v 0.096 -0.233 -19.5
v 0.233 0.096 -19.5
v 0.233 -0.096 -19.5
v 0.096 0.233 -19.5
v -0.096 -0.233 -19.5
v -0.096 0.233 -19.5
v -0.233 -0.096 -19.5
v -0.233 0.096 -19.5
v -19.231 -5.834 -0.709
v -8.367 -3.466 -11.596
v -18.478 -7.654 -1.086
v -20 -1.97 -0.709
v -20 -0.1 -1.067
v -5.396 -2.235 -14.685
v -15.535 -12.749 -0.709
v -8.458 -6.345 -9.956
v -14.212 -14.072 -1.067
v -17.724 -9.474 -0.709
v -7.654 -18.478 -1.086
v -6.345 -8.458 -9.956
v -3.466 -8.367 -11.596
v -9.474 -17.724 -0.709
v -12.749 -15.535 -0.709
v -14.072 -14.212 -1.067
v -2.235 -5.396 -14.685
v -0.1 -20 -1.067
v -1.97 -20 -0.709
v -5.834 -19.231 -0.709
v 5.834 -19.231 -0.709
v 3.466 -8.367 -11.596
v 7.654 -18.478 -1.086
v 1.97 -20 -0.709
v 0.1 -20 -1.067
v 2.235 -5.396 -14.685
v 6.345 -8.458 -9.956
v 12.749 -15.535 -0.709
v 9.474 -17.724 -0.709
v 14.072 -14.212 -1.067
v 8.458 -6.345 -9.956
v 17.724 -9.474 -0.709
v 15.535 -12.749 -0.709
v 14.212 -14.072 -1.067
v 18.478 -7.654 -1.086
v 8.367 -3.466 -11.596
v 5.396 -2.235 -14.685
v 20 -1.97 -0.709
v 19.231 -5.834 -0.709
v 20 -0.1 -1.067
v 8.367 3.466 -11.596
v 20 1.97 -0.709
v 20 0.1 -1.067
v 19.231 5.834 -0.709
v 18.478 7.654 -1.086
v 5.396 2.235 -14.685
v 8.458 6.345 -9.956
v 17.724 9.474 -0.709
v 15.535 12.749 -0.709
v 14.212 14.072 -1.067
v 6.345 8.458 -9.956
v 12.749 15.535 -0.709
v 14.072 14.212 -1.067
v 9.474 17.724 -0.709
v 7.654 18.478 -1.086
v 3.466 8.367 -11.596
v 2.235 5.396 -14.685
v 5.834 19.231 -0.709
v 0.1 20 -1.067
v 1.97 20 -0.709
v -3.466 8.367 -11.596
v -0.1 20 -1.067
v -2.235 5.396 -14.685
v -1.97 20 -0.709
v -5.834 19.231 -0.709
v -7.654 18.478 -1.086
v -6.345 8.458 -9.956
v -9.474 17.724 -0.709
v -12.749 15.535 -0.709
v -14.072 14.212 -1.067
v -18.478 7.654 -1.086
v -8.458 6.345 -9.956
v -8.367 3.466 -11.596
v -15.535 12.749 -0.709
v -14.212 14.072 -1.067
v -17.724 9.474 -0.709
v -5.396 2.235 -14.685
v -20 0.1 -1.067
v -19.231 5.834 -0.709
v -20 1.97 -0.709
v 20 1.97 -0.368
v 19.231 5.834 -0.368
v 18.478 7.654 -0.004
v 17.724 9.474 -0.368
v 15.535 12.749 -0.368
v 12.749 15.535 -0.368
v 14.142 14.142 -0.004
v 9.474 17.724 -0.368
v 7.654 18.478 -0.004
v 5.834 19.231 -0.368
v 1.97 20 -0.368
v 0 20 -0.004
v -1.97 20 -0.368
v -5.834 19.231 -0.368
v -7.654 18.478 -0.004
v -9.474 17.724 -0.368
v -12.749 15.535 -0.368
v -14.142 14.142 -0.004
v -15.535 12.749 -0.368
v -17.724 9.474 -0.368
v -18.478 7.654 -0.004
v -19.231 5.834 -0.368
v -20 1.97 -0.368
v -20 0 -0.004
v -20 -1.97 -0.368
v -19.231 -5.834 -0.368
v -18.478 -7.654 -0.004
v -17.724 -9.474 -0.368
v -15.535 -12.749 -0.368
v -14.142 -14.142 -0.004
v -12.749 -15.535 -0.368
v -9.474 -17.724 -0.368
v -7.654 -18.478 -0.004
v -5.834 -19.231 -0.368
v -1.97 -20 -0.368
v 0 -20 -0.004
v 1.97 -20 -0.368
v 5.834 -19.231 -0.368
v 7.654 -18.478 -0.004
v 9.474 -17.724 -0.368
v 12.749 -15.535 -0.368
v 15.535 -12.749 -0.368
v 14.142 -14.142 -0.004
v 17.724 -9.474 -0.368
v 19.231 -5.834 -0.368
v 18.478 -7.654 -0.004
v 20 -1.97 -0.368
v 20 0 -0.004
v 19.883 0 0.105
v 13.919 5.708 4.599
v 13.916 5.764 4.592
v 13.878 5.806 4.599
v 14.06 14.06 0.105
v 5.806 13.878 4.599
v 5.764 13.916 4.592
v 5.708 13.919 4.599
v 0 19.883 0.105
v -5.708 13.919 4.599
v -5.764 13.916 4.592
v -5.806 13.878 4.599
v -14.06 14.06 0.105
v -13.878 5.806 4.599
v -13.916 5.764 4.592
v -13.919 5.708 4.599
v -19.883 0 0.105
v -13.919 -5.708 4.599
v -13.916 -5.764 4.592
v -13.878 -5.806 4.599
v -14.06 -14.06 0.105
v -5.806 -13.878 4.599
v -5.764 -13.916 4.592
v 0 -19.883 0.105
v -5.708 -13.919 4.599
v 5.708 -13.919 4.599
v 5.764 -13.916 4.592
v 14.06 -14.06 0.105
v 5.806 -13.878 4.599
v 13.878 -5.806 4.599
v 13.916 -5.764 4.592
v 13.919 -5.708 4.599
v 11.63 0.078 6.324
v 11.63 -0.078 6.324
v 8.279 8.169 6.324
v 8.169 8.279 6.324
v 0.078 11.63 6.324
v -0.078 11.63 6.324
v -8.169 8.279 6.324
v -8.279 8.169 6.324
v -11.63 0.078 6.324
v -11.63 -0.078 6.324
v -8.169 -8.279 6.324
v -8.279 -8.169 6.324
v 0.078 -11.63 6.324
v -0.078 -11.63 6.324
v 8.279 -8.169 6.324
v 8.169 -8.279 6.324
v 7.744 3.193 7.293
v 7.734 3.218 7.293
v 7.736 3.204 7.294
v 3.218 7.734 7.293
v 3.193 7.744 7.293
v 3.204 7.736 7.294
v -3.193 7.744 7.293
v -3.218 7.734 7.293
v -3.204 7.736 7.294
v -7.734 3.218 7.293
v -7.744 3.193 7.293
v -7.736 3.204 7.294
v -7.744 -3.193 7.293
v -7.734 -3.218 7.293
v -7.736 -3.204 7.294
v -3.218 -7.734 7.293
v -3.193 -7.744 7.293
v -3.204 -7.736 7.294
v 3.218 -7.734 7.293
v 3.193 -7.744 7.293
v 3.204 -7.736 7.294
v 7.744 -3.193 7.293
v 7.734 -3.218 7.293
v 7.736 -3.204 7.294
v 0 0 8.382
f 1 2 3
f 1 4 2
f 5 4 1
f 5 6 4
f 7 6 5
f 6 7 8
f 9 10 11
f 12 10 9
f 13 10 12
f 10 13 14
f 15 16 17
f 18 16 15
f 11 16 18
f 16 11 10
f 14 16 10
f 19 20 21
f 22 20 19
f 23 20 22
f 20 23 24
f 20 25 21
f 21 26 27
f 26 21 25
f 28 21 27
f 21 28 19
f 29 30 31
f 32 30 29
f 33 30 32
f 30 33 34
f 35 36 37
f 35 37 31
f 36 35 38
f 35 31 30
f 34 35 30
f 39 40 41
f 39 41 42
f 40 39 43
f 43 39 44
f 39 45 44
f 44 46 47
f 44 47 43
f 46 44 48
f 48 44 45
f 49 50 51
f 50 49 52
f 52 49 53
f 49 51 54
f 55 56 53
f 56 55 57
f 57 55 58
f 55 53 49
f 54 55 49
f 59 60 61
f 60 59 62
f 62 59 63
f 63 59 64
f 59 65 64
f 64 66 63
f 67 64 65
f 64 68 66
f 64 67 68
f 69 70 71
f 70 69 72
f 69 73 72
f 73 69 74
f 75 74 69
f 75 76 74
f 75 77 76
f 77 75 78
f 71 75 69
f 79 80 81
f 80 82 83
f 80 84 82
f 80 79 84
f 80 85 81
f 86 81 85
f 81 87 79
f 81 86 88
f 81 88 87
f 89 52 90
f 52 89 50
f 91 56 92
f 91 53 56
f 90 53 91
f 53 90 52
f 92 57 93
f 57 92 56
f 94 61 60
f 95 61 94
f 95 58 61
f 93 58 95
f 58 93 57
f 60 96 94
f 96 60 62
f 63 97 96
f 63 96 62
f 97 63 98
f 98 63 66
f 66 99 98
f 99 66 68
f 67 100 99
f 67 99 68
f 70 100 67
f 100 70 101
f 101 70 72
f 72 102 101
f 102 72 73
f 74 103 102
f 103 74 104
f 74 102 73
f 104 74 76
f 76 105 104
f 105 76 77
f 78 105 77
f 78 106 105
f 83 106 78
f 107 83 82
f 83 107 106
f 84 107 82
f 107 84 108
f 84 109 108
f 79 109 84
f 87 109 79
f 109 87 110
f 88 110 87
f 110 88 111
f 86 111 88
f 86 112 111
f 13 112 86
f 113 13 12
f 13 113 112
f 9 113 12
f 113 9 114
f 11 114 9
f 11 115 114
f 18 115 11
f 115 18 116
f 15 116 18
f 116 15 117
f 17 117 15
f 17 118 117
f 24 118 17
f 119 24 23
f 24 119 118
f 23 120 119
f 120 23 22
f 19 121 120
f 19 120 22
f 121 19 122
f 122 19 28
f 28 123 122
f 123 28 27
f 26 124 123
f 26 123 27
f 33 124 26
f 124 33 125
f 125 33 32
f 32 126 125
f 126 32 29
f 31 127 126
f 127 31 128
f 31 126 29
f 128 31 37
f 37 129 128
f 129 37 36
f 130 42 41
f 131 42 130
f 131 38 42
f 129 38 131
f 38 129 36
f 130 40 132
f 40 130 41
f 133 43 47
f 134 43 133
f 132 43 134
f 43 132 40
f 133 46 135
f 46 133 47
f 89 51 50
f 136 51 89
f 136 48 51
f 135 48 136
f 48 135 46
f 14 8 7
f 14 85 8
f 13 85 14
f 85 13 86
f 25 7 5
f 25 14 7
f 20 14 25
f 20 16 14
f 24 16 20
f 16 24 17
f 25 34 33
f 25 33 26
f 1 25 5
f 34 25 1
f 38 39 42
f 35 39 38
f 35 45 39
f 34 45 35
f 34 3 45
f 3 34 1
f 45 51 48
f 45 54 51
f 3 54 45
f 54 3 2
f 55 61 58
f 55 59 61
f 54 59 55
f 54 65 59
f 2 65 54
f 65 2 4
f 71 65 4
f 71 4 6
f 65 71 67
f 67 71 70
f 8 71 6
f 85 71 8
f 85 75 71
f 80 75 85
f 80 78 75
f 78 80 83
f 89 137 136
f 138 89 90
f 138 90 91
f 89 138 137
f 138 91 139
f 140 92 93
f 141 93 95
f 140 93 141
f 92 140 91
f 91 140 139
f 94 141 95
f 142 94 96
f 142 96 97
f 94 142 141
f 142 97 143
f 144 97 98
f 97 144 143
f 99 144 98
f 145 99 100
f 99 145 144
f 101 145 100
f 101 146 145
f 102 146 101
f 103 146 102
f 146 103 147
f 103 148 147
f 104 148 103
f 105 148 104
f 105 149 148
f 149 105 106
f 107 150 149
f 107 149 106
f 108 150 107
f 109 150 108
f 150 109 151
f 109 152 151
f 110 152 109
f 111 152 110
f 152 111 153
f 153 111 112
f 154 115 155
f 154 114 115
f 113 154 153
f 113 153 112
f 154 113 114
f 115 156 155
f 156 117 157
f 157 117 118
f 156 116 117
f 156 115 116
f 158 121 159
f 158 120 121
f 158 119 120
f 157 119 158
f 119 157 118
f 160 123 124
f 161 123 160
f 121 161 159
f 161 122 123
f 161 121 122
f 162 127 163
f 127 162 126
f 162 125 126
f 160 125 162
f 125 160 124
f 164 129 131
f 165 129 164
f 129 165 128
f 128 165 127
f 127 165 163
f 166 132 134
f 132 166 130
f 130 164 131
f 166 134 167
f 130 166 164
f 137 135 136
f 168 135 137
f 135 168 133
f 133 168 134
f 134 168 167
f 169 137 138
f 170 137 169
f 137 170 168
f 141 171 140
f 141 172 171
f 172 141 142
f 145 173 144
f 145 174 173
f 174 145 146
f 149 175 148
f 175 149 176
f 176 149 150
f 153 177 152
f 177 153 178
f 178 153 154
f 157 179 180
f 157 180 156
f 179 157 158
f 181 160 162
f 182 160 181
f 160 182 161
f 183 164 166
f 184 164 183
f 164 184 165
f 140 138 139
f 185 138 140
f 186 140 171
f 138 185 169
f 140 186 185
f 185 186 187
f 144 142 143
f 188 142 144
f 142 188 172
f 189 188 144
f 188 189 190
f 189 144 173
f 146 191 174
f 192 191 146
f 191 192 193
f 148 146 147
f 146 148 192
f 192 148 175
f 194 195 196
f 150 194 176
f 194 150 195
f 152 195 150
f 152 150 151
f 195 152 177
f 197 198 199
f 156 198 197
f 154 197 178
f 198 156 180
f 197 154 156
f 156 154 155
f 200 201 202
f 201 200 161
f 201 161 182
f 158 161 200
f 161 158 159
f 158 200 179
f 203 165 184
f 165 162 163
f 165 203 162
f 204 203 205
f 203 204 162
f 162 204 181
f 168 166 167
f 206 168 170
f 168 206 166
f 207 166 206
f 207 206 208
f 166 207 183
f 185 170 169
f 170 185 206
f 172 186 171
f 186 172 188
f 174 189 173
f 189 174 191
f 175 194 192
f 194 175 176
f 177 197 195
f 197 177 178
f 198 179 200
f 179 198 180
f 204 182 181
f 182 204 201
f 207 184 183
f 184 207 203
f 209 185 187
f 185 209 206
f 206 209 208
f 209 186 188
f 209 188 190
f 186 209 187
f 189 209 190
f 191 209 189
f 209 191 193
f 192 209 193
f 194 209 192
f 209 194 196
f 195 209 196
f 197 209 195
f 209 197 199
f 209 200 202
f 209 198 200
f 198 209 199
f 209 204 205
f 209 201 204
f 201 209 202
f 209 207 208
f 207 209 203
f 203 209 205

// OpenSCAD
/*
  create a gem based on the guidance in 
     http://www.usfacetersguild.org/gem_designs
     and http://www.ukfcg.org/
  
  see 
  Kit Wallace 
*/

function make_facets(start,increment,limit,axial_angle,height,name) =
    start <= limit
      ? concat([[start/limit*360, axial_angle, height,name]] ,
               make_facets(start+increment,increment,limit,axial_angle,height,name))
      : [] ;

function make_facets_list_r(indexes,i,limit, axial_angle, height,name) =
    i >= 0
      ? concat ([[indexes[i]/limit * 360,axial_angle,height,name,indexes[i]]],
             make_facets_list_r(indexes, i - 1, limit,axial_angle, height,name))
      : [];

function make_facets_list(indexes,limit, axial_angle, height,name) =
    make_facets_list_r(indexes,len(indexes)-1,limit,axial_angle,height,name);

function make_table(height) = [[0,0,height,"table"]];
function make_culet(height) = [[0,180,height,"culet"]];

module body(Size=60) {
    cube(Size,center=true);
}

module cut_facet_data(index_angle,axial_angle,height,Width=200,Depth=50) {
     rotate([0,0,index_angle])
        rotate([0,axial_angle,0])
           translate([0,0,Depth/2 + height])
              cube([Width,Width,Depth],center=true);
}

module cut_facets(facets, n) {
   for (i =[0:n-1]) 
       cut_facet(facets[i]);
}

module cut_facet(facet) {
   cut_facet_data(facet[0],facet[1],facet[2]);
}

function facets_to(facets,name,i=0,start=0) =
    facets[i][3]==name
       ? concat([facets[i]], facets_to(facets,name,i+1,1))
       : start == 0 && i < len(facets)
           ? concat([facets[i]], facets_to(facets,name,i+1,0))
           : []
    ;

module gem_n(facets,n) {
   difference() {
      if (n==1) body(); else gem_n(facets,n-1);
      cut_facet(facets[n-1]);
   }
}

module gem(facets) {
   gem_n(facets,len(facets));
}

function pinwheel_facets() =
 concat( 
    make_table(8.4)   
   ,make_culet(19.5)    
   ,make_facets(3,6,96,44.4+180,14.5,"pb")    
   ,make_facets(3,3,96,90,20,"g")        
   ,make_facets(0,12,96,43+180,14.42,"pm")   
   ,make_facets(3,6,96,43.5,13.5,"c1 breaks")       
   ,make_facets(0,12,96,37,12.05,"c2 mains")        
   ,make_facets(6,12,96,22,9.9,"c3 stars")         
   ,make_facets(0,12,96,14,8.95,"c4 high stars")    
   ,make_facets(0,12,96,8,8.3,"c5 pinwheel")       
  );

function ccsq03_facets() =
 concat( 
    make_table(6)   
   ,make_culet(27)    
   ,make_facets(4,4,96,42+180,20,"p1")    
   ,make_facets(0,24,96,90,23.5,"g1")        
   ,make_facets(12,24,96,90,30,"g2")   
   ,make_facets(0,24,96,63+180,21,"p2")
       
   ,make_facets(0,24,96,42,16,"c1")        
   ,make_facets(12,24,96,40,19.5,"c2")         
   ,make_facets(0,24,96,32,13.3,"c3")         
   ,make_facets_list([2,22,26,46,50,70,74,94],96,23,11.35,"c4")    
   ,make_facets(0,24,96,12,8.7,"c5")         
   ,make_facets(12,24,96,22.9,12.9,"c6")       
  );

facets = facets_to(ccsq03_facets(),"p2");
facets = pinwheel_facets();
echo(facets);
gem(facets);
